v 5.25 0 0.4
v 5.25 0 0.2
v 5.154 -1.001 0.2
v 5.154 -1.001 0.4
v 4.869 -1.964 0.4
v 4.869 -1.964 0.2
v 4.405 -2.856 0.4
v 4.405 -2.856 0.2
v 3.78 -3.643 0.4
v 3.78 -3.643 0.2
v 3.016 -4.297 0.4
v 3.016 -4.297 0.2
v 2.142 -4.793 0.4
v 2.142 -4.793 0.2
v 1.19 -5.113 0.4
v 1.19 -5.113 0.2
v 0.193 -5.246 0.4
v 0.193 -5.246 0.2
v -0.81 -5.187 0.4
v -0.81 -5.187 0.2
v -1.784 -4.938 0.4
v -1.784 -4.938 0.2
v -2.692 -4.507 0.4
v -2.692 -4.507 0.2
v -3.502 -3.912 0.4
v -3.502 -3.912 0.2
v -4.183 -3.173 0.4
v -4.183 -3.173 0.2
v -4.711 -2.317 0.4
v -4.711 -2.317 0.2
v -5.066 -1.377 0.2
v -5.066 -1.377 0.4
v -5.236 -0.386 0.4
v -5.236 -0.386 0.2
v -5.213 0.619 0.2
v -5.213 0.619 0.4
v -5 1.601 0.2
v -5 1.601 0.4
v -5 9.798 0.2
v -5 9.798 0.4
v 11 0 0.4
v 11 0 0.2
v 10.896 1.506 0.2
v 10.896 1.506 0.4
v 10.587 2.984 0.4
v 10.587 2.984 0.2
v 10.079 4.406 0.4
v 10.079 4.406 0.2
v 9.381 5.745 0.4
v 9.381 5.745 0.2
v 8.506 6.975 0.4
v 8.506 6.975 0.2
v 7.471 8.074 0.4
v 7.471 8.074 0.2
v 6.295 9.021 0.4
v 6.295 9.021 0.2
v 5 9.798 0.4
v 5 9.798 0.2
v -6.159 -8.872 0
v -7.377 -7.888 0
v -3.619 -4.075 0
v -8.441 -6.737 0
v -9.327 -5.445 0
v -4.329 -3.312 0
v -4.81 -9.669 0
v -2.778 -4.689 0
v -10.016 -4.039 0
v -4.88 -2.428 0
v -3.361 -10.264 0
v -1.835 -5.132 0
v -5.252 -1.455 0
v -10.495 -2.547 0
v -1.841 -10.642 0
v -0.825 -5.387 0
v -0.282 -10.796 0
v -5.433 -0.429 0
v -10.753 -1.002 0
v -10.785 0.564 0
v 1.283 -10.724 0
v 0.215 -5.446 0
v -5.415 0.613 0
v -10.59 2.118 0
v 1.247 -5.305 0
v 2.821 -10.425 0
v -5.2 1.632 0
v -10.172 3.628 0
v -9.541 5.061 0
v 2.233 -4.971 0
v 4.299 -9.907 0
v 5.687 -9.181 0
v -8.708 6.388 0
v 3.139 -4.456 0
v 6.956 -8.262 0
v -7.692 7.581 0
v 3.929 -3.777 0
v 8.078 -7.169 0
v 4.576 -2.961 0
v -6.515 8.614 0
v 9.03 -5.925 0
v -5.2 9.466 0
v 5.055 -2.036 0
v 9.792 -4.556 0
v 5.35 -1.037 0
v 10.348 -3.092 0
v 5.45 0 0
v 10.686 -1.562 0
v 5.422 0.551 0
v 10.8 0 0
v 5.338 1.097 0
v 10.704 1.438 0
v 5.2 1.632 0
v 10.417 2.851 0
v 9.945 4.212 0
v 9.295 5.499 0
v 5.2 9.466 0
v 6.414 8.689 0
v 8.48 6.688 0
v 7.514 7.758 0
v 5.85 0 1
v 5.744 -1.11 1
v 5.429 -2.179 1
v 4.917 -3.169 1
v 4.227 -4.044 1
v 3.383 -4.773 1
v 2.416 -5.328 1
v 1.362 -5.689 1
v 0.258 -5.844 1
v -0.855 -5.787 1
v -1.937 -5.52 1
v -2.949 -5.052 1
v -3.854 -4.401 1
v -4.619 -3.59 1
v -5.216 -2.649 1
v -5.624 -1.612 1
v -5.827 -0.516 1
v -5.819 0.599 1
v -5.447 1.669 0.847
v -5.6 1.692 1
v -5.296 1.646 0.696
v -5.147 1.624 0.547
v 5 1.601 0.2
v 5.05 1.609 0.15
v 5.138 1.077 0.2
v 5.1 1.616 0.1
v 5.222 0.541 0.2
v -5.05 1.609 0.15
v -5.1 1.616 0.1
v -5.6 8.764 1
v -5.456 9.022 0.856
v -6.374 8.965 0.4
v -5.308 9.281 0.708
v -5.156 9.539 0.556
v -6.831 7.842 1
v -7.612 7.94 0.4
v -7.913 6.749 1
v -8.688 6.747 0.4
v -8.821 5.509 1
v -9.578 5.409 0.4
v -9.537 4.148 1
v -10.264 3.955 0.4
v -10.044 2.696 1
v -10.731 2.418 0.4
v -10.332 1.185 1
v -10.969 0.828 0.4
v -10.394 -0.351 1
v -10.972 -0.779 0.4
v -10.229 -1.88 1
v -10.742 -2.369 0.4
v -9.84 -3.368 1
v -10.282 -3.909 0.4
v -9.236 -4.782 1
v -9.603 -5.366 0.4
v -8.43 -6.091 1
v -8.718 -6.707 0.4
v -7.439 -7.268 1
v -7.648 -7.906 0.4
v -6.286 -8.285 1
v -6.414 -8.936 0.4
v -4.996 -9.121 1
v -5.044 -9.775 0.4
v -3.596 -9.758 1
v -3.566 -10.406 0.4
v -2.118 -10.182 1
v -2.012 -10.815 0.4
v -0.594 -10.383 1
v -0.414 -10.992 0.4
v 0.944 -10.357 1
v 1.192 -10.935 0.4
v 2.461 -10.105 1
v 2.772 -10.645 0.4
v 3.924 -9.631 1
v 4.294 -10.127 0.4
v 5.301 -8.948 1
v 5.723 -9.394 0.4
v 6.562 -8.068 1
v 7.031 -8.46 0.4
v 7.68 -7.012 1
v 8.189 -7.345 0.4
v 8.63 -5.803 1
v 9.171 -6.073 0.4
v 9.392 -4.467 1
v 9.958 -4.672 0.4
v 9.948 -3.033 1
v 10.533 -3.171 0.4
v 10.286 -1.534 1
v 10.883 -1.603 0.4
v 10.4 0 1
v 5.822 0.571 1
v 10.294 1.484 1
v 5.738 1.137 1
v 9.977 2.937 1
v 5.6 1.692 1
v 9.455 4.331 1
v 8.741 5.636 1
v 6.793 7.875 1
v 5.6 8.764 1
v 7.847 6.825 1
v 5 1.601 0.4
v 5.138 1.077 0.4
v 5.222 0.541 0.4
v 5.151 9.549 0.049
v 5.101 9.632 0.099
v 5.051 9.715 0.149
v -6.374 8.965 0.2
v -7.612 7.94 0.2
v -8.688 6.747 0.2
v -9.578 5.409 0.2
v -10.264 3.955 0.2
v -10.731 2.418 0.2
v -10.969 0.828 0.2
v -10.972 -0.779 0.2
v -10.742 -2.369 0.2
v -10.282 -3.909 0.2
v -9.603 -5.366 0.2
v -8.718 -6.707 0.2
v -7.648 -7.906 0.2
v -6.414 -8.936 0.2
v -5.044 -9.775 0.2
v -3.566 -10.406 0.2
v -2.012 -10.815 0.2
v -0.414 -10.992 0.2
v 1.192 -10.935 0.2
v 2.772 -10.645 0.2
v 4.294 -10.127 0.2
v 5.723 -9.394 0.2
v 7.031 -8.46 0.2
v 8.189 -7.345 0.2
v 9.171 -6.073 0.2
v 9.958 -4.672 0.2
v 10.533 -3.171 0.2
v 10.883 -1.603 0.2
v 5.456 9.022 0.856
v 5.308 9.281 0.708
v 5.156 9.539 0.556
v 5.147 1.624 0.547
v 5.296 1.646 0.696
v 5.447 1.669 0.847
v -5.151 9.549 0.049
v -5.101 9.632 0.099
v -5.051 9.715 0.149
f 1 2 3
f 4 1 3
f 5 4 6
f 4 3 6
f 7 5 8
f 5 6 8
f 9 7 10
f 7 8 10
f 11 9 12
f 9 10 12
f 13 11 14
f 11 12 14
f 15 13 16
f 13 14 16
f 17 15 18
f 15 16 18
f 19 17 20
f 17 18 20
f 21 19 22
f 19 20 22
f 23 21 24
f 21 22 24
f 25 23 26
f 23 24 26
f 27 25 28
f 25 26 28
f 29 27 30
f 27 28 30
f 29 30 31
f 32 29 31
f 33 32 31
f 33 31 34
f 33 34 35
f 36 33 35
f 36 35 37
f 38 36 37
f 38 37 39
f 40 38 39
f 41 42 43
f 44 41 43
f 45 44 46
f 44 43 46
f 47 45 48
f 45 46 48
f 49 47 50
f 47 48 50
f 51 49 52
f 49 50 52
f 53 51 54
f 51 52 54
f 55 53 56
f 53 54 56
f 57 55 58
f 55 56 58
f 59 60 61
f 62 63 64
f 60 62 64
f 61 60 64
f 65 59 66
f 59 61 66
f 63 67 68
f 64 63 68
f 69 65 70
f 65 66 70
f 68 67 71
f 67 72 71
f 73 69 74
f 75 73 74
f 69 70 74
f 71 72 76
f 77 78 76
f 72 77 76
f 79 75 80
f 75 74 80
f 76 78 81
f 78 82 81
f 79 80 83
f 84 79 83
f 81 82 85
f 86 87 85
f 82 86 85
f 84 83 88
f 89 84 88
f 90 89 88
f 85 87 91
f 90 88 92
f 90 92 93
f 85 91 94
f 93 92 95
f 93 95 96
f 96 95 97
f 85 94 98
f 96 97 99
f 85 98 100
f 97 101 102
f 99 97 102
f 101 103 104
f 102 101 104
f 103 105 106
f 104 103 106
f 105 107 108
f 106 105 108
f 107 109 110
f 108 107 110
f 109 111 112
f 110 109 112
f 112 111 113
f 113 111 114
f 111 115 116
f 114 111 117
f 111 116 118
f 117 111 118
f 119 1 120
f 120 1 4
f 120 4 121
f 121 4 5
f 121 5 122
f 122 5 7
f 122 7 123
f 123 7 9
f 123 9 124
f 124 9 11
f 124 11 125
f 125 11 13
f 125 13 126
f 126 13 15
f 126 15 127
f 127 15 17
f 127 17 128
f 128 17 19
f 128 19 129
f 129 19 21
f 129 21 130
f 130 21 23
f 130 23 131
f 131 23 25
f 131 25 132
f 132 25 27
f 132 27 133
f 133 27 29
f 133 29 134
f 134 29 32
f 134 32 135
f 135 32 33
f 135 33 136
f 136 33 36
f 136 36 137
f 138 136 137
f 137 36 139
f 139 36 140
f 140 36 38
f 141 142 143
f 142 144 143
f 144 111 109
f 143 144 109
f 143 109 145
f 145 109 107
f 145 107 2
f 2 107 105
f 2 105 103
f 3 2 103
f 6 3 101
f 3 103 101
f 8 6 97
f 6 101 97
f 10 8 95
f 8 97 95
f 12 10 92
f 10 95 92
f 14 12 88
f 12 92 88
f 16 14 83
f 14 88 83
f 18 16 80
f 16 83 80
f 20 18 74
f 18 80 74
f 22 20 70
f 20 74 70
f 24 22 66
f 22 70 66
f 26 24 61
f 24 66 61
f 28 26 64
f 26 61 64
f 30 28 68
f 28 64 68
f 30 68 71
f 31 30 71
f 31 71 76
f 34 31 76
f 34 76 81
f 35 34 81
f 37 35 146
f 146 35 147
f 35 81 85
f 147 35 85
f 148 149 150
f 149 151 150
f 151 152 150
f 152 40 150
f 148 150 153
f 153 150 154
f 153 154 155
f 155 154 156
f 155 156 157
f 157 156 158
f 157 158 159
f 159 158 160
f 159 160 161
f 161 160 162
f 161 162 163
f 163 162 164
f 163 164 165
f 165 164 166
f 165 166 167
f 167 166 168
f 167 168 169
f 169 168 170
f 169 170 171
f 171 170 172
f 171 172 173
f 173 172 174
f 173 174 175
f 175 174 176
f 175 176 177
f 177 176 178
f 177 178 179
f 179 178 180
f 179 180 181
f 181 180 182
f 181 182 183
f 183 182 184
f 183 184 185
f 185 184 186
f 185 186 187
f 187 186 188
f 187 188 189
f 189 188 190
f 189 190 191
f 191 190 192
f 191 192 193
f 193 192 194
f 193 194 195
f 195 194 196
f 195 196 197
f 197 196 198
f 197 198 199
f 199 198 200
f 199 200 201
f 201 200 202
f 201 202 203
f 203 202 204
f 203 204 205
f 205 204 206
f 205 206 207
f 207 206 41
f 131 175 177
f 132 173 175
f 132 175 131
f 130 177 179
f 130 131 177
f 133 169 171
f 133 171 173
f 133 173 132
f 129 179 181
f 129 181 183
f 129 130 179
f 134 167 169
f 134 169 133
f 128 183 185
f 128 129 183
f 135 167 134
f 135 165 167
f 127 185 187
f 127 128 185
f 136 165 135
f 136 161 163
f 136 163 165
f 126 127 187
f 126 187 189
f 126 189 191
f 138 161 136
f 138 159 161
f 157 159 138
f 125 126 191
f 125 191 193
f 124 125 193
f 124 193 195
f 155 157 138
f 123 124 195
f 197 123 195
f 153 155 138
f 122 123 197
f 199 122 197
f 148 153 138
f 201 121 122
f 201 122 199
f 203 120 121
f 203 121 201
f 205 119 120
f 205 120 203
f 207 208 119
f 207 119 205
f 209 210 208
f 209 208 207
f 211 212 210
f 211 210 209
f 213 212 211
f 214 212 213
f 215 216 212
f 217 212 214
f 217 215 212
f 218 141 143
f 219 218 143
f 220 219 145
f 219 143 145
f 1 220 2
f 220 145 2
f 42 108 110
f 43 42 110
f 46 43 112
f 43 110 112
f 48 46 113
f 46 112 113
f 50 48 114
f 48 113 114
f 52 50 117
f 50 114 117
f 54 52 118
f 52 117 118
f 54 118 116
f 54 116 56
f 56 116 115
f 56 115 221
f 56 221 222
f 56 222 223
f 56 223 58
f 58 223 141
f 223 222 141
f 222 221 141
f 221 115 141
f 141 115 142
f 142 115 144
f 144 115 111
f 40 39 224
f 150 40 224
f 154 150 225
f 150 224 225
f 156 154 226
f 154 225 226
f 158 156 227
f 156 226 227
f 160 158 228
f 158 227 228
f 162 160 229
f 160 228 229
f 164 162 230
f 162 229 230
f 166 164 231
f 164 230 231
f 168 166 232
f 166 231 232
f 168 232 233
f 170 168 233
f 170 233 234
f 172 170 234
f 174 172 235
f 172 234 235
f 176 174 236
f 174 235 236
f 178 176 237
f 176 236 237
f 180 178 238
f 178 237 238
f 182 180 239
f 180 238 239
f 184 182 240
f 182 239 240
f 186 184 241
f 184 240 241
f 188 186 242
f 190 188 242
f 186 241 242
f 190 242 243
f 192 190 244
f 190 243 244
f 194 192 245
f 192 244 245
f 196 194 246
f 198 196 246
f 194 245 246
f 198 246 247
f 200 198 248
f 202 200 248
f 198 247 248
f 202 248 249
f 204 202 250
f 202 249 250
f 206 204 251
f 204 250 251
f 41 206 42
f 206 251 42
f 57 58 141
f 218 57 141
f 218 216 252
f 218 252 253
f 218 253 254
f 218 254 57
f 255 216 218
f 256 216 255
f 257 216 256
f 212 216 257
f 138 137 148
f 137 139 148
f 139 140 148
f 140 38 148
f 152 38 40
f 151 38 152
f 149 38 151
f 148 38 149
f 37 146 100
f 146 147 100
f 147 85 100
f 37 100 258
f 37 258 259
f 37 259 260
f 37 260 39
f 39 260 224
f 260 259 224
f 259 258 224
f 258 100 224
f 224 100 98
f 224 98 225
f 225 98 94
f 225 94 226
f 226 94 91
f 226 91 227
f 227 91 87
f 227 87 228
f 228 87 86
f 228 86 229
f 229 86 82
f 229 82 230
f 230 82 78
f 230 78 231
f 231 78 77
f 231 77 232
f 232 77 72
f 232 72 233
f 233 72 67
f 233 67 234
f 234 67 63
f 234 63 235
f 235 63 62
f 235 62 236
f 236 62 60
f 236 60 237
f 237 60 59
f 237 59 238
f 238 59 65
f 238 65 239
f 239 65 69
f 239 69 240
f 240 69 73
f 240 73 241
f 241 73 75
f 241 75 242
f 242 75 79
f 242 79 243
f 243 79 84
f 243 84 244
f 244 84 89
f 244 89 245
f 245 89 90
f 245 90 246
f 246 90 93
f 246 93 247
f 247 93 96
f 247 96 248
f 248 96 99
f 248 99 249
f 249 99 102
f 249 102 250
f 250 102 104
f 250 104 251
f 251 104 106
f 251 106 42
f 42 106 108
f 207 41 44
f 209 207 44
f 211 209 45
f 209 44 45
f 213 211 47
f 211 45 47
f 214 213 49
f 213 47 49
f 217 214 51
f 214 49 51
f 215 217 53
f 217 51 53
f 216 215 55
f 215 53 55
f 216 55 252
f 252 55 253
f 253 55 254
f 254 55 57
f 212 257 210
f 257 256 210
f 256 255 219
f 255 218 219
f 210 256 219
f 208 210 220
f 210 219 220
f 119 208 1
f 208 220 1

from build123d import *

# Parameters (mm, degrees)
F1_DEPTH = 1
F2_SIZE  = 0.2
F3_SIZE  = 0.6


with BuildPart() as f1:
    # F0 (on Top) → F1 (new body)
    with BuildSketch(Plane.XY):
        with BuildLine():
            ThreePointArc((5, 1.6007810594), (5.1871234803, 0.8100925873), (5.25, 0))
            ThreePointArc((5.25, 0), (-0.8100925873, -5.1871234803), (-5, 1.6007810594))
            Line((-5, 1.6007810594), (-5, 9.7979589711))
            ThreePointArc((-5, 9.7979589711), (-5.7445626465, -9.3808315196), (11, 0))
            ThreePointArc((11, 0), (9.3808315196, 5.7445626465), (5, 9.7979589711))
            Line((5, 9.7979589711), (5, 1.6007810594))
        make_face()
    extrude(amount=F1_DEPTH)

    # F2
    f2_edges = [f1.edges().sort_by_distance(p)[0] for p in [
        (0, -5.25, 0),
        (-5, 5.69937, 0),
        (-5.744563, -9.380832, 0),
        (9.380832, 5.744563, 0),
        (5, 5.69937, 0),
    ]]
    chamfer(f2_edges, length=F2_SIZE)

    # F3
    f3_edges = [f1.edges().sort_by_distance(p)[0] for p in [
        (0, -5.25, 1),
        (-5, 5.69937, 1),
        (-5.744563, -9.380832, 1),
        (9.380832, 5.744563, 1),
        (5, 5.69937, 1),
    ]]
    chamfer(f3_edges, length=F3_SIZE)


solid = f1.part
